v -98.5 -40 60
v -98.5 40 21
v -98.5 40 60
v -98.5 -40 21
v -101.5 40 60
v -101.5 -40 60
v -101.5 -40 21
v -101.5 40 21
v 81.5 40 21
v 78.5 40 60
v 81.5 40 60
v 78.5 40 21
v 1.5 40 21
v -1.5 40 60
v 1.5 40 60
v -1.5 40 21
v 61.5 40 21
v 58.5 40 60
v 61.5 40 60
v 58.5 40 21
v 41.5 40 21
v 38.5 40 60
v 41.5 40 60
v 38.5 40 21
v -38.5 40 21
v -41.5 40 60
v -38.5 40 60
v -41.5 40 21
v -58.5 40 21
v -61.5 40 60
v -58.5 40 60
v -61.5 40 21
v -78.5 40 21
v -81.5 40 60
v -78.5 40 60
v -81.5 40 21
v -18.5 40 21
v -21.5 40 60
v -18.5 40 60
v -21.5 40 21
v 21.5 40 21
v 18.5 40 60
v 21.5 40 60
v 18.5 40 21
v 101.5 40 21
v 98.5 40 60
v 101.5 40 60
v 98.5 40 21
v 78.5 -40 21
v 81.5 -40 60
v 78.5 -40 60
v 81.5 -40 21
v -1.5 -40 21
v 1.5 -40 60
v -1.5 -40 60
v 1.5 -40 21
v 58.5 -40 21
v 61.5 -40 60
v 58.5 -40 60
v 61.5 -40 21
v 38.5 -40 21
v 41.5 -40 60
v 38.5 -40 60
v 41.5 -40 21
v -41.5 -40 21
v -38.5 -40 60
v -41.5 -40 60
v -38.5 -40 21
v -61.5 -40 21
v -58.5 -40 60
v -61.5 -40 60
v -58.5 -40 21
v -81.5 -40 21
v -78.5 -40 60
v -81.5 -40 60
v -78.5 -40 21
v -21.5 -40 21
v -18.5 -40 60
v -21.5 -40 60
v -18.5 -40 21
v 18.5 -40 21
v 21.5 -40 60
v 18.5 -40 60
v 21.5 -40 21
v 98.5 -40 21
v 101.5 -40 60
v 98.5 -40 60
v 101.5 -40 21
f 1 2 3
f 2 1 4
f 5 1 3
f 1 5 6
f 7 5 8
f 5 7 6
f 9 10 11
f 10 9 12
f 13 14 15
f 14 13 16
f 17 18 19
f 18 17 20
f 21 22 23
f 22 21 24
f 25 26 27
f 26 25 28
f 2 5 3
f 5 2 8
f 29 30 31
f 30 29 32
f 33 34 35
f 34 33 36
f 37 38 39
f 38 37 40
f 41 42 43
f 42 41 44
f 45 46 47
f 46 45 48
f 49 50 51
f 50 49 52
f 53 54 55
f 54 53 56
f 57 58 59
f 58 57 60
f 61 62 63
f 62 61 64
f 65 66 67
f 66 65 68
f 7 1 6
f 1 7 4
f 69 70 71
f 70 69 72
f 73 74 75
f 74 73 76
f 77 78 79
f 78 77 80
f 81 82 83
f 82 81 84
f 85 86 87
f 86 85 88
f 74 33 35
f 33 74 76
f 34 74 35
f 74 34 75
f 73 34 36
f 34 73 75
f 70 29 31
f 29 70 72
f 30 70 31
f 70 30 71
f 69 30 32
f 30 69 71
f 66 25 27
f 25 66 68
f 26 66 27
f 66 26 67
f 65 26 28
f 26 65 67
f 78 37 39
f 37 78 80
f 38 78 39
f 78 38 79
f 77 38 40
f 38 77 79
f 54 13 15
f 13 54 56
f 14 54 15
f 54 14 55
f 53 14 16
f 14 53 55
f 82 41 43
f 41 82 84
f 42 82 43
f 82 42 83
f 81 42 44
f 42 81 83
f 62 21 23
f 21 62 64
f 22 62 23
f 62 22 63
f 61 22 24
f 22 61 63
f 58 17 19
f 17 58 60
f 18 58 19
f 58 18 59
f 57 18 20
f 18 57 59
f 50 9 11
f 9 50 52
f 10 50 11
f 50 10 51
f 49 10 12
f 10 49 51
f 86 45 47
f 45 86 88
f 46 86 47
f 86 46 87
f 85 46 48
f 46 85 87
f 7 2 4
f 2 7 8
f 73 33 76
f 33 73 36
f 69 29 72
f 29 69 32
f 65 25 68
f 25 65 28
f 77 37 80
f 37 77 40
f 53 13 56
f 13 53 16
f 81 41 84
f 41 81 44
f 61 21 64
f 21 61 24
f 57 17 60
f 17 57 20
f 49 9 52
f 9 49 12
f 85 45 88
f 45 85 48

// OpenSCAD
// Petri Dish Rack for 10 dishes (90mm diameter)
// Designed for FDM printing

// --- Dimensions ---
base_length = 203;          // X dimension of the base
base_width = 80;            // Y dimension of the base
base_height = 20;           // Z dimension of the base

dish_radius = 45;           // Radius of 90mm dish
cradle_radius = 46;         // Radius of the cutting cylinder
cradle_z_offset = 52;       // Z-coordinate of the cylinder axis
cradle_bottom_z = 6;        // Calculated bottom of cradle (52 - 46)

num_dividers = 11;          // Number of solid divider plates
divider_thickness = 3;      // Thickness of each divider (X)
divider_height = 60;        // Height of dividers (Z)
divider_spacing_x = 20;     // Distance between divider centers (X)

// --- Constants ---
$fn = 64;

// --- Implementation ---

// The rack is built by taking the base and adding dividers, 
// then subtracting the cradle from the whole assembly.
// However, the prompt specifies the cradle is NOT cut through the dividers.
// To achieve this, we build the base and dividers, then subtract the cradle 
// only from the parts that are not dividers. 
// A cleaner way: Build the base, add dividers, then subtract the cradle 
// from the base only. But the prompt says "A curved cradle... is cut along its whole length".
// And "the cradle is not cut through them [the dividers]".
// This implies the dividers are solid blocks that "interrupt" the cradle cut.

module rack() {
    union() {
        // 1. The Base
        translate([-base_length/2, -base_width/2, 0])
            cube([base_length, base_width, base_height]);

        // 2. The Dividers
        // They rise from z=0 to z=60.
        // They are placed at x = -100, -80, ..., 100.
        for (i = [0 : num_dividers - 1]) {
            // Calculate X position based on the sequence -100 to 100
            // The sequence is -100, -80, -60, -40, -20, 0, 20, 40, 60, 80, 100
            x_pos = -100 + (i * divider_spacing_x);
            
            translate([x_pos - divider_thickness/2, -base_width/2, 0])
                cube([divider_thickness, base_width, divider_height]);
        }
    }

    // 3. The Cradle Cut
    // The cradle is a cylinder running along X.
    // It is NOT cut through the dividers.
    // To implement "not cut through them", we use a difference() 
    // where we only subtract the cylinder from the base.
    // Wait, the prompt says "A curved cradle... is cut along its whole length" 
    // and "the cradle is not cut through them [the dividers]".
    // This means the cradle exists in the gaps between dividers.
    
    // Correct logic: 
    // We want the base to have a groove, but the dividers to remain solid.
    // Since the dividers are added to the base, we subtract the cylinder 
    // from the base ONLY, not the dividers.
    
    // However, the cradle axis is at z=52, and the base is only 20mm tall.
    // If the cylinder radius is 46 and axis is at 52, the bottom of the cut is 52-46 = 6.
    // Since the base is 20mm tall, the cut goes from z=6 to z=20 (and beyond).
    // This means the cradle cuts into the base.
}

// To satisfy "cradle is not cut through them [the dividers]", 
// we must subtract the cylinder from the base, but NOT from the dividers.
// Since the dividers are added to the base, we must subtract the cylinder 
// from the base specifically.

difference() {
    // The main body (Base + Dividers)
    union() {
        // Base
        translate([-base_length/2, -base_width/2, 0])
            cube([base_length, base_width, base_height]);
        
        // Dividers
        for (i = [0 : num_dividers - 1]) {
            x_pos = -100 + (i * divider_spacing_x);
            translate([x_pos - divider_thickness/2, -base_width/2, 0])
                cube([divider_thickness, base_width, divider_height]);
        }
    }

    // The Cradle Cut (applied only to the base area)
    // To ensure it doesn't cut the dividers, we intersect the cylinder 
    // with the base volume.
    intersection() {
        // The cylinder shape
        rotate([0, 90, 0])
            translate([0, 0, -base_length/2 - 1]) // Extend past X faces
                cylinder(h = base_length + 2, r = cradle_radius);
        
        // The base volume (to restrict the cut to the base only)
        translate([-base_length/2 - 1, -base_width/2 - 1, 0])
            cube([base_length + 2, base_width + 2, base_height + 1]);
            
        // We must also ensure the cut doesn't touch the dividers.
        // We do this by subtracting the dividers' X-footprint from the cylinder's footprint.
        // But the prompt says "the cradle is not cut through them".
        // This means the groove is interrupted by the dividers.
        // The easiest way is to subtract the cylinder from the base, 
        // then add the dividers back on top.
    }
}

// RE-RE-IMPLEMENTATION for strict adherence to "cradle not cut through dividers"
// 1. Create Base
// 2. Subtract Cradle from Base
// 3. Add Dividers (which are solid and not cut)

module final_rack() {
    difference() {
        // Base
        translate([-base_length/2, -base_width/2, 0])
            cube([base_length, base_width, base_height]);
        
        // Cradle cut (restricted to base)
        translate([0, 0, cradle_z_offset])
        rotate([0, 90, 0])
            cylinder(h = base_length + 2, r = cradle_radius);
    }

    // Add Dividers (placed on top/through the base)
    for (i = [0 : num_dividers - 1]) {
        x_pos = -100 + (i * divider_spacing_x);
        translate([x_pos - divider_thickness/2, -base_width/2, 0])
            cube([divider_thickness, base_width, divider_height]);
    }
}

// Clear previous and render
// (The code above is a draft, the final block below is the clean version)
